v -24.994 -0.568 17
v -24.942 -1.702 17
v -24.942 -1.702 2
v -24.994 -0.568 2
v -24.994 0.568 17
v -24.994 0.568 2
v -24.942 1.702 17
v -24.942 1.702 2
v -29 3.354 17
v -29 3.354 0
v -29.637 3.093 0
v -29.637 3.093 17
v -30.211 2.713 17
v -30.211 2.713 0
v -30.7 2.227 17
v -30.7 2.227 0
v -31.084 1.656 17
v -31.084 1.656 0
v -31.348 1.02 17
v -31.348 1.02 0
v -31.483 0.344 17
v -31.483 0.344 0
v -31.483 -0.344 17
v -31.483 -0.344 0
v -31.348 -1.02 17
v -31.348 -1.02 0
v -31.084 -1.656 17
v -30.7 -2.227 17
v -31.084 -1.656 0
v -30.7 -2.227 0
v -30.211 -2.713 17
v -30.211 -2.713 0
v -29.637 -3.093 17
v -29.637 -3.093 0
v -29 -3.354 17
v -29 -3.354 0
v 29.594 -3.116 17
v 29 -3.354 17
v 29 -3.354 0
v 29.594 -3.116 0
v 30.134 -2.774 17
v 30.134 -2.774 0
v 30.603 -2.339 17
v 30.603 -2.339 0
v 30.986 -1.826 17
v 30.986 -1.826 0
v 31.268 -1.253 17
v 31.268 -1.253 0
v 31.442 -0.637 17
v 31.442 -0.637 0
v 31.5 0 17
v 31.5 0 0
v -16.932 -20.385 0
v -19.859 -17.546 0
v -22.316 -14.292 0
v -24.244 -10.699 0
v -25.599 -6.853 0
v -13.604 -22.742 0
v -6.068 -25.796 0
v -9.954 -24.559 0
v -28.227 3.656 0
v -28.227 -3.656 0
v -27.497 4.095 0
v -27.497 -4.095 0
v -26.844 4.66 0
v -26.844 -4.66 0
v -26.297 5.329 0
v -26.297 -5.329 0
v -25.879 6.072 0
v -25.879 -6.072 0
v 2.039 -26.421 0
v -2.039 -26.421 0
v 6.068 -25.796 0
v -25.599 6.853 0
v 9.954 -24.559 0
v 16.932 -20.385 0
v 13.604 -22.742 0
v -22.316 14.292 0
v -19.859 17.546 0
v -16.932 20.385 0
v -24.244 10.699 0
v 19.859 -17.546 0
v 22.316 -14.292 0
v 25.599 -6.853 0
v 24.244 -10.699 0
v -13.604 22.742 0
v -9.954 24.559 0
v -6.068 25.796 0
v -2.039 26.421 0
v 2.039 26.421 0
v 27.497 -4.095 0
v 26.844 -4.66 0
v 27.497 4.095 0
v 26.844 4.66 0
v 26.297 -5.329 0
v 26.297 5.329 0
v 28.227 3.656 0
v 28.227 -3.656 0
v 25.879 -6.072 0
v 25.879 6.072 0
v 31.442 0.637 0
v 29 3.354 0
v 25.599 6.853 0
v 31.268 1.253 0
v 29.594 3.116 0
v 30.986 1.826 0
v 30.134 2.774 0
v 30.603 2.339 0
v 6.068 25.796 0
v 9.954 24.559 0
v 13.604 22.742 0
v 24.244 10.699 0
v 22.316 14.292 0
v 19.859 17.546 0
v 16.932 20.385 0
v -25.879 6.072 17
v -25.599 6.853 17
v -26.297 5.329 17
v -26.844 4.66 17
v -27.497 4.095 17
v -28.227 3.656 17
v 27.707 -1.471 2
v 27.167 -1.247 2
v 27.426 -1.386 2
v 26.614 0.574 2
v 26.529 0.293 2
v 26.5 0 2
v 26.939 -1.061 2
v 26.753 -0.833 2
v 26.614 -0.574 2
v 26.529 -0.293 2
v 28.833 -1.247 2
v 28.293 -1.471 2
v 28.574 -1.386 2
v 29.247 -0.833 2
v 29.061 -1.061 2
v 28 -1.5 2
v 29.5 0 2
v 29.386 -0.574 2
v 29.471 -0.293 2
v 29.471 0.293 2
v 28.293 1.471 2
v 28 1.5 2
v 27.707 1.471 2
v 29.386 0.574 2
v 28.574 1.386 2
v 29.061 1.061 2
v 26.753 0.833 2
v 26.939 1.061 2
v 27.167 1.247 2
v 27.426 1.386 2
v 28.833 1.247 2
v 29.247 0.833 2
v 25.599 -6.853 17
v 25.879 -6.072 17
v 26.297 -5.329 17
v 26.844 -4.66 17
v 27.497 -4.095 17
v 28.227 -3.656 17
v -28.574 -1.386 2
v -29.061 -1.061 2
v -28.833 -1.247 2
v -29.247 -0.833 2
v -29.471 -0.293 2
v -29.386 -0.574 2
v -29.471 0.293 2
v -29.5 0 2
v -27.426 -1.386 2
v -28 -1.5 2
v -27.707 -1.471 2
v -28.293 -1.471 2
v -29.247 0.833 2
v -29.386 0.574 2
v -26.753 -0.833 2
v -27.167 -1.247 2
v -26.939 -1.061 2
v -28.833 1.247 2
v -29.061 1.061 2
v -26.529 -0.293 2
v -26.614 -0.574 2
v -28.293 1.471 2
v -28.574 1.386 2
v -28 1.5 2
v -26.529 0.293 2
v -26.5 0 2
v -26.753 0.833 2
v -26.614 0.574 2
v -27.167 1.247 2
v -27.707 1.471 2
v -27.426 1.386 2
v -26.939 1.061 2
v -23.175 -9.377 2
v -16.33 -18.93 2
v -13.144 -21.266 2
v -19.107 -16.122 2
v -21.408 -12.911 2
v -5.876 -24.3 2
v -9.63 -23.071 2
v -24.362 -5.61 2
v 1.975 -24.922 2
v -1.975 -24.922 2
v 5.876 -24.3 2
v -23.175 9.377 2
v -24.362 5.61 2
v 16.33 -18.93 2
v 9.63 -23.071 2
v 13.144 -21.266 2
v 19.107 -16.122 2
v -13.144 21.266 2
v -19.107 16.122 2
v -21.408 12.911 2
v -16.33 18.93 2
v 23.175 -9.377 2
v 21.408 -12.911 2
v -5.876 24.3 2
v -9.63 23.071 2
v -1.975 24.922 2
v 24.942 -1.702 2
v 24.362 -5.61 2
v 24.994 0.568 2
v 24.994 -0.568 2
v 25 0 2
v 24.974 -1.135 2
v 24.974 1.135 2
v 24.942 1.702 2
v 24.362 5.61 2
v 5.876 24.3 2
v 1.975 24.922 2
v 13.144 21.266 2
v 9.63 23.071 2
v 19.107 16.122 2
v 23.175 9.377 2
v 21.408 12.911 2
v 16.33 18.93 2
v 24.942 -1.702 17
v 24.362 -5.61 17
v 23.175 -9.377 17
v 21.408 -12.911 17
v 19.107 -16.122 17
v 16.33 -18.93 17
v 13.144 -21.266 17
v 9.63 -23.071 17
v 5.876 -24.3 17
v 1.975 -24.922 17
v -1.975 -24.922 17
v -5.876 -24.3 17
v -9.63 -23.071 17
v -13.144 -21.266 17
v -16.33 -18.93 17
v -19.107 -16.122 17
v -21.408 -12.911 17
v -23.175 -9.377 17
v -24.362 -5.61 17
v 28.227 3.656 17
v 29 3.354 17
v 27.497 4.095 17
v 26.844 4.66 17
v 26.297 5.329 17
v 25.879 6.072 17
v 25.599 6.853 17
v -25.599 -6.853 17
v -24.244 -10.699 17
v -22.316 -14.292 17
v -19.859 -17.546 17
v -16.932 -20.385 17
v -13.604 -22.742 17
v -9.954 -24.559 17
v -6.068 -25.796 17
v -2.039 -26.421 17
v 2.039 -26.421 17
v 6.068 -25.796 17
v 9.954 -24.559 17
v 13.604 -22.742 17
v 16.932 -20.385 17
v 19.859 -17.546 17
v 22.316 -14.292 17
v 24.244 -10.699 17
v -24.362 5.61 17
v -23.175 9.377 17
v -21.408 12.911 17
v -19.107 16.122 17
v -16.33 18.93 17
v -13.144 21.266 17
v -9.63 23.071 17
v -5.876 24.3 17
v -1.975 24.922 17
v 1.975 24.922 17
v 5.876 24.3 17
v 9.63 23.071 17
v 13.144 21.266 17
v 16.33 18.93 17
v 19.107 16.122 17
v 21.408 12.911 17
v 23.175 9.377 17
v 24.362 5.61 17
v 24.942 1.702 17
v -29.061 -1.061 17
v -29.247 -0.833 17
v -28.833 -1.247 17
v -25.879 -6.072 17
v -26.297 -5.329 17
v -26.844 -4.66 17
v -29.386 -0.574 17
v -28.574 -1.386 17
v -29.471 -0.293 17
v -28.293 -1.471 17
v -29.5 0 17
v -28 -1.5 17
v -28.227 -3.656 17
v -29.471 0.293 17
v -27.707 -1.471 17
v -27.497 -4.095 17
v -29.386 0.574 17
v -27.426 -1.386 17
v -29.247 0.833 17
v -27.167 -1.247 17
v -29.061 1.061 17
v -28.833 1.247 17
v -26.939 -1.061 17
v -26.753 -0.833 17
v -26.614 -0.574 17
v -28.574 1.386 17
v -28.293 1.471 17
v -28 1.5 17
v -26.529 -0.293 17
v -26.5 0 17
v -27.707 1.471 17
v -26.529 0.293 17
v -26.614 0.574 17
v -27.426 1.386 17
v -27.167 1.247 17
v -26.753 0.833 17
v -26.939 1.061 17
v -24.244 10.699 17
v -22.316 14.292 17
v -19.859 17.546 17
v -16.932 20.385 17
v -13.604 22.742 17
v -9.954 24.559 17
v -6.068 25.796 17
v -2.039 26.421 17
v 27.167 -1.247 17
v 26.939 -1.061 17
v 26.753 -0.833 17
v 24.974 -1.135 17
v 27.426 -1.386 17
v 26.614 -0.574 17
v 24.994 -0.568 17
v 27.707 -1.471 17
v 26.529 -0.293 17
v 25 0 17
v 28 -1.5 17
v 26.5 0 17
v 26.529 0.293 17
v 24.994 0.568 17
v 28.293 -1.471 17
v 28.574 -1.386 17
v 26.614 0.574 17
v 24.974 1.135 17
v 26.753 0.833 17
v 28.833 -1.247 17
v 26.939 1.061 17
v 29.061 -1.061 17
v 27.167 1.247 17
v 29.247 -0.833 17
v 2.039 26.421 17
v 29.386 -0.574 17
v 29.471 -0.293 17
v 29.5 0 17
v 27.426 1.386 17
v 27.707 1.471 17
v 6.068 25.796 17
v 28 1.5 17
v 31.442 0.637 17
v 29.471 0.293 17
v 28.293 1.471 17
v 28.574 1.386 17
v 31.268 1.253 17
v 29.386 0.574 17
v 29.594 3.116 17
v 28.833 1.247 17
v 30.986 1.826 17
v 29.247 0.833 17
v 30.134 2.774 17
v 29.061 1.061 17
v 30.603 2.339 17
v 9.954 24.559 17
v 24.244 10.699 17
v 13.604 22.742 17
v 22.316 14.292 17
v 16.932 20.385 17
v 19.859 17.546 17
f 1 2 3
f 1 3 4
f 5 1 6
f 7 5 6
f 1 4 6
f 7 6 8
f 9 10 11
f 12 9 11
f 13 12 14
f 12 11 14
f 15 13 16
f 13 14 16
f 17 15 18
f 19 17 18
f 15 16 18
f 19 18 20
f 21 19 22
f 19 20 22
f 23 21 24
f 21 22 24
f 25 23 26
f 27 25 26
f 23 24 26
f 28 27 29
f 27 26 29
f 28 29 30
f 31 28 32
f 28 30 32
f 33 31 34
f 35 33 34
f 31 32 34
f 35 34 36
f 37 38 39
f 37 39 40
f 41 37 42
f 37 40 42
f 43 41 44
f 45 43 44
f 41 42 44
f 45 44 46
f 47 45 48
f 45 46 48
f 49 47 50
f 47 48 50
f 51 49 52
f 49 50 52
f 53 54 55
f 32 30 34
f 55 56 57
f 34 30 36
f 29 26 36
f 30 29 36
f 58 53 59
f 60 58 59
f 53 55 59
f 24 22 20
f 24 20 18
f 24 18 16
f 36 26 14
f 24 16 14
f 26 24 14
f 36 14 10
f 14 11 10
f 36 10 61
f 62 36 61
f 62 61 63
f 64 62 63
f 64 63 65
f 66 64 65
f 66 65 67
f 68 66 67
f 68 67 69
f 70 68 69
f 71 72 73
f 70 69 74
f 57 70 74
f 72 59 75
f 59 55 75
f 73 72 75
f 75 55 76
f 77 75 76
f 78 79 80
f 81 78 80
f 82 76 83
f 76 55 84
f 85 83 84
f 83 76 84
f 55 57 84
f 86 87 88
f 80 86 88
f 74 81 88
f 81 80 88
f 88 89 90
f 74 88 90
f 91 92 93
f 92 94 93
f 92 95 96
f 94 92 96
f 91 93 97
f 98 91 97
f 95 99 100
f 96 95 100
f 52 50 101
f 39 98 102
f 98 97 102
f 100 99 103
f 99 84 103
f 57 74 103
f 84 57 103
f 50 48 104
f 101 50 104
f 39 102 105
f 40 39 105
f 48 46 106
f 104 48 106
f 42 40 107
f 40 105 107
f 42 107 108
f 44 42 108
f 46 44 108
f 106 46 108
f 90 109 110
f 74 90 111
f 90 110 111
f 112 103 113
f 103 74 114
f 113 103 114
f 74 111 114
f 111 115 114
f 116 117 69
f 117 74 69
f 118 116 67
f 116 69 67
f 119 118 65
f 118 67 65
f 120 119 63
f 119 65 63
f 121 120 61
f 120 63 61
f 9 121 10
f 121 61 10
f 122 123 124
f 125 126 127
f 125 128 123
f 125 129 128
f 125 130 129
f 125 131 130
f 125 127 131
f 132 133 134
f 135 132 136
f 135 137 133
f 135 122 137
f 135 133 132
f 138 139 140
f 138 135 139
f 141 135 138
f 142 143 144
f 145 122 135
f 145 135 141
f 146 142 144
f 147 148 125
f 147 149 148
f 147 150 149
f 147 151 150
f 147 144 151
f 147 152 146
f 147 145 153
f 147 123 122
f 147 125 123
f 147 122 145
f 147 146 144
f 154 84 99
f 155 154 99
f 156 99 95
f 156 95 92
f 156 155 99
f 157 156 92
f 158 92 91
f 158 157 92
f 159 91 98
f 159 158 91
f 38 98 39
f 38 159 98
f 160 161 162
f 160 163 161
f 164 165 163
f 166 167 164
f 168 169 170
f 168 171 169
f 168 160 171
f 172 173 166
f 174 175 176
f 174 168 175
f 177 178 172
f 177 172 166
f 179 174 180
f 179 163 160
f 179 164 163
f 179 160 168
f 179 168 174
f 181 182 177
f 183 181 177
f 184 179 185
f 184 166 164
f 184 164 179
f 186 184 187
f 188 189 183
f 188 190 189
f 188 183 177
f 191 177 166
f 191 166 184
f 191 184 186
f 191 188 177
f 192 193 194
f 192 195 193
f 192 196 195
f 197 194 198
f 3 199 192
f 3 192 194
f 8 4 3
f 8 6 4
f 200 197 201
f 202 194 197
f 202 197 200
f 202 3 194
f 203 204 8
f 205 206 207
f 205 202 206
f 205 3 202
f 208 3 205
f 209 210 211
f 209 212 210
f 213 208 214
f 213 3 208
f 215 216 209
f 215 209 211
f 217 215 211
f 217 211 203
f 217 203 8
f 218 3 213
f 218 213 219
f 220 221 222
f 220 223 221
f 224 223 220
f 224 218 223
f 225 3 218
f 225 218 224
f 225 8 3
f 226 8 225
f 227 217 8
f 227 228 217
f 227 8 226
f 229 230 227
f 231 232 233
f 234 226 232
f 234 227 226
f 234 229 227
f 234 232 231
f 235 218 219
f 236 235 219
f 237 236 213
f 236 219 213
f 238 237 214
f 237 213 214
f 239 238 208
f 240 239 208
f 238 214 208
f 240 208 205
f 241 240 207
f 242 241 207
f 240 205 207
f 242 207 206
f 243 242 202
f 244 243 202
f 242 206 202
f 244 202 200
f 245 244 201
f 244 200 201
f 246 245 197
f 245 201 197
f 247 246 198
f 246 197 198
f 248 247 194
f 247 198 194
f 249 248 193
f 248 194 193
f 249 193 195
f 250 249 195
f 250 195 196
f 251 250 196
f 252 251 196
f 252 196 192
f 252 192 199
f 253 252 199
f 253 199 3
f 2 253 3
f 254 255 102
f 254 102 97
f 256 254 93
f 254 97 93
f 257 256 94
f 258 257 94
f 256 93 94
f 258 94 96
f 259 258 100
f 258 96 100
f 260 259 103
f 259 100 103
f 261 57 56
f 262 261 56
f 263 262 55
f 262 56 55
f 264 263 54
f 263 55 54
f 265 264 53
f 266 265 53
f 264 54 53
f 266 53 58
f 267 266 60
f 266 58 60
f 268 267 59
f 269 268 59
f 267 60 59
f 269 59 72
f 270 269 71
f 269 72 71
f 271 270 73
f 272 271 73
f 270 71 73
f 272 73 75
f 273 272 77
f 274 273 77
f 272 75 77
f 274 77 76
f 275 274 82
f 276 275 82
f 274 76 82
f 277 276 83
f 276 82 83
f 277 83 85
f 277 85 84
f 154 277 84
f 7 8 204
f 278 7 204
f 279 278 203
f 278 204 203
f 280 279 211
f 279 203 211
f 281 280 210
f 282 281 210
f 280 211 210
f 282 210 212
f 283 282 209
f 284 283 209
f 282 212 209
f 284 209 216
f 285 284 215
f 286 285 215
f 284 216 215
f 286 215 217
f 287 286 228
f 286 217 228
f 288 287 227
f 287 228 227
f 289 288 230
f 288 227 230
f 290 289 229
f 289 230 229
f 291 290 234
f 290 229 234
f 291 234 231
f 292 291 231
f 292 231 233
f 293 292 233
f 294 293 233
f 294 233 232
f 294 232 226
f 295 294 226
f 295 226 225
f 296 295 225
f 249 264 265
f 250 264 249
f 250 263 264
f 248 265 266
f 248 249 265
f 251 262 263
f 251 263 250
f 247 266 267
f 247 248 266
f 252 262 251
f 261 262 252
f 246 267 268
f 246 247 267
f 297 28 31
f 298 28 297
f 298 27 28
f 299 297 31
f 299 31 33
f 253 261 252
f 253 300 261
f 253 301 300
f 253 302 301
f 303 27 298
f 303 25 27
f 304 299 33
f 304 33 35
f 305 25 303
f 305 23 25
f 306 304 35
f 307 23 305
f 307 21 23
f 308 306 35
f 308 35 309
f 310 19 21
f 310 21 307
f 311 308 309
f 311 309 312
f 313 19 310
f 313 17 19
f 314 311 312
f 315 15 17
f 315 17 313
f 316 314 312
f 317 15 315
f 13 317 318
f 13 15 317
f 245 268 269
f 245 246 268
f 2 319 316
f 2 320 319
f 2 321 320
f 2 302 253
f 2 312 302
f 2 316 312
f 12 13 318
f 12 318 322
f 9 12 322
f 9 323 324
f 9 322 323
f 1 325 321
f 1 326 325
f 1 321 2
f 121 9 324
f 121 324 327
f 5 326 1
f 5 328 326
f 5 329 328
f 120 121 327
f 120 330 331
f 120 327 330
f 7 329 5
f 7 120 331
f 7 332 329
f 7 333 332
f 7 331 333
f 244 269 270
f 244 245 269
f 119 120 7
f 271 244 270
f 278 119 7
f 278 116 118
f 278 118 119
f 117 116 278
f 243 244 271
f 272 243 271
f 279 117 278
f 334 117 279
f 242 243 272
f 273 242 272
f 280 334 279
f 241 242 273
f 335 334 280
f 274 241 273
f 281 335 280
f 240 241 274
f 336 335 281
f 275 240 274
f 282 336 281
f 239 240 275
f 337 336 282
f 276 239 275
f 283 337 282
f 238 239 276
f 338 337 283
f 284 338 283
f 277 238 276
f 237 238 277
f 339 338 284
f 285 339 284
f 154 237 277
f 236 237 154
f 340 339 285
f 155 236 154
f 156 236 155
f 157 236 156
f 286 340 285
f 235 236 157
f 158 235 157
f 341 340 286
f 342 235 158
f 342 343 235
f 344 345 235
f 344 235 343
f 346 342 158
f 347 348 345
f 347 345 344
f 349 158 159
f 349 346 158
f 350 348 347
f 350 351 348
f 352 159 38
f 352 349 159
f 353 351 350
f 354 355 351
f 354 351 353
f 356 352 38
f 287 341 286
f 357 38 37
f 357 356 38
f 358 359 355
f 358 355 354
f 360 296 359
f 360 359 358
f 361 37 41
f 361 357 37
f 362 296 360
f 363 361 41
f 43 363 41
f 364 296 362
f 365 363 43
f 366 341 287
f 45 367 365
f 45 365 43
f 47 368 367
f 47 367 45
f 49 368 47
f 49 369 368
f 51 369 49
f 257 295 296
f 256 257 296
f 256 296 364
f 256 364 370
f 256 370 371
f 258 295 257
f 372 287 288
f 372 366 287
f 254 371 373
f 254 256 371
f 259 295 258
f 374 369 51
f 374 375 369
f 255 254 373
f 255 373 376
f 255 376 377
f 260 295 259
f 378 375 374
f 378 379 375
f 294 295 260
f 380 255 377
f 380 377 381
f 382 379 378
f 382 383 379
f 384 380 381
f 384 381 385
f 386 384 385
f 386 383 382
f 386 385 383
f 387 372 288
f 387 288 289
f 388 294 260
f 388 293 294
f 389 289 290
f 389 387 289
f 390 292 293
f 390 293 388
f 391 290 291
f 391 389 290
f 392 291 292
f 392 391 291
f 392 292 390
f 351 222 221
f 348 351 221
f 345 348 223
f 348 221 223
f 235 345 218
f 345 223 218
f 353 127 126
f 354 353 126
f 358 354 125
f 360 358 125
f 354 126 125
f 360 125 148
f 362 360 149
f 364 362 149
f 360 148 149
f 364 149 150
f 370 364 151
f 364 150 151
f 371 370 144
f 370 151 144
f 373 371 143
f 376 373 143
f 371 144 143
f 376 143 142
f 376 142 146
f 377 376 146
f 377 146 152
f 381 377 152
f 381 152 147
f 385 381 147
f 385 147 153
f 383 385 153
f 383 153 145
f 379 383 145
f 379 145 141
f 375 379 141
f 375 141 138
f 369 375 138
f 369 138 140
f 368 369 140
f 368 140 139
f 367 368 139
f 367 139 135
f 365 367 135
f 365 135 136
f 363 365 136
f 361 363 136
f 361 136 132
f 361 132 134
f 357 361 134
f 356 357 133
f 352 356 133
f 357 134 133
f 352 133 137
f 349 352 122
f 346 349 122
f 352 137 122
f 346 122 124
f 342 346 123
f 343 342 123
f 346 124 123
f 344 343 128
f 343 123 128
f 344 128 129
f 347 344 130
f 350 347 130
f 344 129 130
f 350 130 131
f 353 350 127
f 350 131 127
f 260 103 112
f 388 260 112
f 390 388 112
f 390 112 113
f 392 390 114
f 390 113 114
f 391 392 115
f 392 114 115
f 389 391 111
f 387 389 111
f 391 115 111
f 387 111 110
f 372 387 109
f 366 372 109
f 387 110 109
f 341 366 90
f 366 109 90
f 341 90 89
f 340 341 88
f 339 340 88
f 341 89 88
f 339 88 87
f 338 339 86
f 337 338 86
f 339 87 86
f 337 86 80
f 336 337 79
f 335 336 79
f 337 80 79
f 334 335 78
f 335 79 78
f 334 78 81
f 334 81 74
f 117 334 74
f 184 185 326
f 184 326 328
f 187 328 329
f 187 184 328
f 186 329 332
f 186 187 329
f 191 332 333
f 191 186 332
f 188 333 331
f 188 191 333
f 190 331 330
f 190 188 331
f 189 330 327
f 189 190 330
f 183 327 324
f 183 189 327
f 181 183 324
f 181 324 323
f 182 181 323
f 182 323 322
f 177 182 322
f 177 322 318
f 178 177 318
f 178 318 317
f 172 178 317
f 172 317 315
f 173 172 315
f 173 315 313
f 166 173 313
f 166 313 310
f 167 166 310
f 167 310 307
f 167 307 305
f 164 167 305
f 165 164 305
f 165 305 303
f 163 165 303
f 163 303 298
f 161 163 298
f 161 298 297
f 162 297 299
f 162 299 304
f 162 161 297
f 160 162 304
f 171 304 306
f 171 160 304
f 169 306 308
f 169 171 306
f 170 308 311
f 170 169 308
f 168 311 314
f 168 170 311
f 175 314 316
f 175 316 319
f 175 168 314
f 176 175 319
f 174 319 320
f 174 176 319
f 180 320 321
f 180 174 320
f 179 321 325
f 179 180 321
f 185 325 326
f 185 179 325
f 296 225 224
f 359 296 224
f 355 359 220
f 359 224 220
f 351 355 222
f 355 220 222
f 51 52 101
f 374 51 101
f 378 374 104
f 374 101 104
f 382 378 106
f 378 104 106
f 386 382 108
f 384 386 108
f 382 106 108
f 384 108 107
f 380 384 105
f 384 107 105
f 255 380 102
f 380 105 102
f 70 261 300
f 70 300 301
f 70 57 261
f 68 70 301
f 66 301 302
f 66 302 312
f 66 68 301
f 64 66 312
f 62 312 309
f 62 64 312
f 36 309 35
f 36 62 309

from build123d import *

# Parameters (mm, degrees)
F0_R     = 1.5
F1_DEPTH = 17
F2_DEPTH = 2
F3_R     = 5


with BuildPart() as f1:
    # F0 (on Top) → F1 (new body)
    with BuildSketch(Plane.XY):
        with BuildLine():
            ThreePointArc((24.9419642857, 1.7024739558), (24.9854868588, 0.8517314298), (25, 0))
            ThreePointArc((25, 0), (24.9854868588, -0.8517314298), (24.9419642857, -1.7024739558))
            ThreePointArc((24.9419642857, -1.7024739558), (25.5347963833, -2.4845062142), (26.3214285714, -3.0712209232))
            ThreePointArc((26.3214285714, -3.0712209232), (26.4553194759, -1.538203962), (26.5, 0))
            ThreePointArc((26.5, 0), (26.4553194759, 1.538203962), (26.3214285714, 3.0712209232))
            ThreePointArc((26.3214285714, 3.0712209232), (25.5347963833, 2.4845062142), (24.9419642857, 1.7024739558))
        make_face()
        with BuildLine():
            ThreePointArc((-24.9419642857, 1.7024739558), (0, 25), (24.9419642857, 1.7024739558))
            ThreePointArc((24.9419642857, 1.7024739558), (25.5347963833, 2.4845062142), (26.3214285714, 3.0712209232))
            ThreePointArc((26.3214285714, 3.0712209232), (0, 26.5), (-26.3214285714, 3.0712209232))
            ThreePointArc((-26.3214285714, 3.0712209232), (-25.5347963833, 2.4845062142), (-24.9419642857, 1.7024739558))
        make_face()
        with BuildLine():
            ThreePointArc((26.3214285714, -3.0712209232), (25.5347963833, -2.4845062142), (24.9419642857, -1.7024739558))
            ThreePointArc((24.9419642857, -1.7024739558), (0, -25), (-24.9419642857, -1.7024739558))
            ThreePointArc((-24.9419642857, -1.7024739558), (-25.5347963833, -2.4845062142), (-26.3214285714, -3.0712209232))
            ThreePointArc((-26.3214285714, -3.0712209232), (0, -26.5), (26.3214285714, -3.0712209232))
        make_face()
        with BuildLine():
            ThreePointArc((-24.9419642857, -1.7024739558), (-25, 0), (-24.9419642857, 1.7024739558))
            ThreePointArc((-24.9419642857, 1.7024739558), (-25.5347963833, 2.4845062142), (-26.3214285714, 3.0712209232))
            ThreePointArc((-26.3214285714, 3.0712209232), (-26.4553194759, 1.538203962), (-26.5, 0))
            ThreePointArc((-26.5, 0), (-26.4553194759, -1.538203962), (-26.3214285714, -3.0712209232))
            ThreePointArc((-26.3214285714, -3.0712209232), (-25.5347963833, -2.4845062142), (-24.9419642857, -1.7024739558))
        make_face()
        with BuildLine():
            ThreePointArc((31.5, 0), (29.7853571071, 3.0103986447), (26.3214285714, 3.0712209232))
            ThreePointArc((26.3214285714, 3.0712209232), (26.4553194759, 1.538203962), (26.5, 0))
            ThreePointArc((26.5, 0), (26.4553194759, -1.538203962), (26.3214285714, -3.0712209232))
            ThreePointArc((26.3214285714, -3.0712209232), (29.7853571071, -3.0103986447), (31.5, 0))
        make_face()
        with BuildLine():
            ThreePointArc((29.5, 0), (28, -1.5), (26.5, 0))
            ThreePointArc((26.5, 0), (28, 1.5), (29.5, 0))
        make_face(mode=Mode.SUBTRACT)
        with BuildLine():
            ThreePointArc((-26.5, 0), (-26.4553194759, 1.538203962), (-26.3214285714, 3.0712209232))
            ThreePointArc((-26.3214285714, 3.0712209232), (-31.5, 0), (-26.3214285714, -3.0712209232))
            ThreePointArc((-26.3214285714, -3.0712209232), (-26.4553194759, -1.538203962), (-26.5, 0))
        make_face()
        with Locations((-28, 0)):
            Circle(F0_R, mode=Mode.SUBTRACT)
    extrude(amount=F1_DEPTH)

    # F0 (on Top) → F2 (join)
    with BuildSketch(Plane.XY):
        with BuildLine():
            ThreePointArc((24.9419642857, 1.7024739558), (24.9854868588, 0.8517314298), (25, 0))
            ThreePointArc((25, 0), (24.9854868588, -0.8517314298), (24.9419642857, -1.7024739558))
            ThreePointArc((24.9419642857, -1.7024739558), (25.5347963833, -2.4845062142), (26.3214285714, -3.0712209232))
            ThreePointArc((26.3214285714, -3.0712209232), (26.4553194759, -1.538203962), (26.5, 0))
            ThreePointArc((26.5, 0), (26.4553194759, 1.538203962), (26.3214285714, 3.0712209232))
            ThreePointArc((26.3214285714, 3.0712209232), (25.5347963833, 2.4845062142), (24.9419642857, 1.7024739558))
        make_face()
        with BuildLine():
            ThreePointArc((-24.9419642857, 1.7024739558), (0, 25), (24.9419642857, 1.7024739558))
            ThreePointArc((24.9419642857, 1.7024739558), (25.5347963833, 2.4845062142), (26.3214285714, 3.0712209232))
            ThreePointArc((26.3214285714, 3.0712209232), (0, 26.5), (-26.3214285714, 3.0712209232))
            ThreePointArc((-26.3214285714, 3.0712209232), (-25.5347963833, 2.4845062142), (-24.9419642857, 1.7024739558))
        make_face()
        with BuildLine():
            ThreePointArc((26.3214285714, -3.0712209232), (25.5347963833, -2.4845062142), (24.9419642857, -1.7024739558))
            ThreePointArc((24.9419642857, -1.7024739558), (0, -25), (-24.9419642857, -1.7024739558))
            ThreePointArc((-24.9419642857, -1.7024739558), (-25.5347963833, -2.4845062142), (-26.3214285714, -3.0712209232))
            ThreePointArc((-26.3214285714, -3.0712209232), (0, -26.5), (26.3214285714, -3.0712209232))
        make_face()
        with BuildLine():
            ThreePointArc((-24.9419642857, -1.7024739558), (-25, 0), (-24.9419642857, 1.7024739558))
            ThreePointArc((-24.9419642857, 1.7024739558), (-25.5347963833, 2.4845062142), (-26.3214285714, 3.0712209232))
            ThreePointArc((-26.3214285714, 3.0712209232), (-26.4553194759, 1.538203962), (-26.5, 0))
            ThreePointArc((-26.5, 0), (-26.4553194759, -1.538203962), (-26.3214285714, -3.0712209232))
            ThreePointArc((-26.3214285714, -3.0712209232), (-25.5347963833, -2.4845062142), (-24.9419642857, -1.7024739558))
        make_face()
        with BuildLine():
            ThreePointArc((31.5, 0), (29.7853571071, 3.0103986447), (26.3214285714, 3.0712209232))
            ThreePointArc((26.3214285714, 3.0712209232), (26.4553194759, 1.538203962), (26.5, 0))
            ThreePointArc((26.5, 0), (26.4553194759, -1.538203962), (26.3214285714, -3.0712209232))
            ThreePointArc((26.3214285714, -3.0712209232), (29.7853571071, -3.0103986447), (31.5, 0))
        make_face()
        with BuildLine():
            ThreePointArc((29.5, 0), (28, -1.5), (26.5, 0))
            ThreePointArc((26.5, 0), (28, 1.5), (29.5, 0))
        make_face(mode=Mode.SUBTRACT)
        with BuildLine():
            ThreePointArc((-26.5, 0), (-26.4553194759, 1.538203962), (-26.3214285714, 3.0712209232))
            ThreePointArc((-26.3214285714, 3.0712209232), (-31.5, 0), (-26.3214285714, -3.0712209232))
            ThreePointArc((-26.3214285714, -3.0712209232), (-26.4553194759, -1.538203962), (-26.5, 0))
        make_face()
        with Locations((-28, 0)):
            Circle(F0_R, mode=Mode.SUBTRACT)
        with BuildLine():
            ThreePointArc((24.9419642857, -1.7024739558), (24.5, 0), (24.9419642857, 1.7024739558))
            ThreePointArc((24.9419642857, 1.7024739558), (0, 25), (-24.9419642857, 1.7024739558))
            ThreePointArc((-24.9419642857, 1.7024739558), (-24.6122924418, 0.879452955), (-24.5, 0))
            ThreePointArc((-24.5, 0), (-24.6122924418, -0.879452955), (-24.9419642857, -1.7024739558))
            ThreePointArc((-24.9419642857, -1.7024739558), (0, -25), (24.9419642857, -1.7024739558))
        make_face()
        with BuildLine():
            ThreePointArc((-24.5, 0), (-24.6122924418, 0.879452955), (-24.9419642857, 1.7024739558))
            ThreePointArc((-24.9419642857, 1.7024739558), (-25, 0), (-24.9419642857, -1.7024739558))
            ThreePointArc((-24.9419642857, -1.7024739558), (-24.6122924418, -0.879452955), (-24.5, 0))
        make_face()
        with BuildLine():
            ThreePointArc((24.9419642857, -1.7024739558), (24.9854868588, -0.8517314298), (25, 0))
            ThreePointArc((25, 0), (24.9854868588, 0.8517314298), (24.9419642857, 1.7024739558))
            ThreePointArc((24.9419642857, 1.7024739558), (24.5, 0), (24.9419642857, -1.7024739558))
        make_face()
        with Locations((-28, 0)):
            Circle(F0_R)
        with BuildLine():
            ThreePointArc((29.5, 0), (28, 1.5), (26.5, 0))
            ThreePointArc((26.5, 0), (28, -1.5), (29.5, 0))
        make_face()
    extrude(amount=F2_DEPTH)

    # F3
    f3_edges = [f1.edges().sort_by_distance(p)[0] for p in [
        (-26.321429, 3.071221, 8.5),
        (-26.321429, -3.071221, 8.5),
        (26.321429, -3.071221, 8.5),
        (26.321429, 3.071221, 8.5),
    ]]
    fillet(f3_edges, radius=F3_R)


solid = f1.part
